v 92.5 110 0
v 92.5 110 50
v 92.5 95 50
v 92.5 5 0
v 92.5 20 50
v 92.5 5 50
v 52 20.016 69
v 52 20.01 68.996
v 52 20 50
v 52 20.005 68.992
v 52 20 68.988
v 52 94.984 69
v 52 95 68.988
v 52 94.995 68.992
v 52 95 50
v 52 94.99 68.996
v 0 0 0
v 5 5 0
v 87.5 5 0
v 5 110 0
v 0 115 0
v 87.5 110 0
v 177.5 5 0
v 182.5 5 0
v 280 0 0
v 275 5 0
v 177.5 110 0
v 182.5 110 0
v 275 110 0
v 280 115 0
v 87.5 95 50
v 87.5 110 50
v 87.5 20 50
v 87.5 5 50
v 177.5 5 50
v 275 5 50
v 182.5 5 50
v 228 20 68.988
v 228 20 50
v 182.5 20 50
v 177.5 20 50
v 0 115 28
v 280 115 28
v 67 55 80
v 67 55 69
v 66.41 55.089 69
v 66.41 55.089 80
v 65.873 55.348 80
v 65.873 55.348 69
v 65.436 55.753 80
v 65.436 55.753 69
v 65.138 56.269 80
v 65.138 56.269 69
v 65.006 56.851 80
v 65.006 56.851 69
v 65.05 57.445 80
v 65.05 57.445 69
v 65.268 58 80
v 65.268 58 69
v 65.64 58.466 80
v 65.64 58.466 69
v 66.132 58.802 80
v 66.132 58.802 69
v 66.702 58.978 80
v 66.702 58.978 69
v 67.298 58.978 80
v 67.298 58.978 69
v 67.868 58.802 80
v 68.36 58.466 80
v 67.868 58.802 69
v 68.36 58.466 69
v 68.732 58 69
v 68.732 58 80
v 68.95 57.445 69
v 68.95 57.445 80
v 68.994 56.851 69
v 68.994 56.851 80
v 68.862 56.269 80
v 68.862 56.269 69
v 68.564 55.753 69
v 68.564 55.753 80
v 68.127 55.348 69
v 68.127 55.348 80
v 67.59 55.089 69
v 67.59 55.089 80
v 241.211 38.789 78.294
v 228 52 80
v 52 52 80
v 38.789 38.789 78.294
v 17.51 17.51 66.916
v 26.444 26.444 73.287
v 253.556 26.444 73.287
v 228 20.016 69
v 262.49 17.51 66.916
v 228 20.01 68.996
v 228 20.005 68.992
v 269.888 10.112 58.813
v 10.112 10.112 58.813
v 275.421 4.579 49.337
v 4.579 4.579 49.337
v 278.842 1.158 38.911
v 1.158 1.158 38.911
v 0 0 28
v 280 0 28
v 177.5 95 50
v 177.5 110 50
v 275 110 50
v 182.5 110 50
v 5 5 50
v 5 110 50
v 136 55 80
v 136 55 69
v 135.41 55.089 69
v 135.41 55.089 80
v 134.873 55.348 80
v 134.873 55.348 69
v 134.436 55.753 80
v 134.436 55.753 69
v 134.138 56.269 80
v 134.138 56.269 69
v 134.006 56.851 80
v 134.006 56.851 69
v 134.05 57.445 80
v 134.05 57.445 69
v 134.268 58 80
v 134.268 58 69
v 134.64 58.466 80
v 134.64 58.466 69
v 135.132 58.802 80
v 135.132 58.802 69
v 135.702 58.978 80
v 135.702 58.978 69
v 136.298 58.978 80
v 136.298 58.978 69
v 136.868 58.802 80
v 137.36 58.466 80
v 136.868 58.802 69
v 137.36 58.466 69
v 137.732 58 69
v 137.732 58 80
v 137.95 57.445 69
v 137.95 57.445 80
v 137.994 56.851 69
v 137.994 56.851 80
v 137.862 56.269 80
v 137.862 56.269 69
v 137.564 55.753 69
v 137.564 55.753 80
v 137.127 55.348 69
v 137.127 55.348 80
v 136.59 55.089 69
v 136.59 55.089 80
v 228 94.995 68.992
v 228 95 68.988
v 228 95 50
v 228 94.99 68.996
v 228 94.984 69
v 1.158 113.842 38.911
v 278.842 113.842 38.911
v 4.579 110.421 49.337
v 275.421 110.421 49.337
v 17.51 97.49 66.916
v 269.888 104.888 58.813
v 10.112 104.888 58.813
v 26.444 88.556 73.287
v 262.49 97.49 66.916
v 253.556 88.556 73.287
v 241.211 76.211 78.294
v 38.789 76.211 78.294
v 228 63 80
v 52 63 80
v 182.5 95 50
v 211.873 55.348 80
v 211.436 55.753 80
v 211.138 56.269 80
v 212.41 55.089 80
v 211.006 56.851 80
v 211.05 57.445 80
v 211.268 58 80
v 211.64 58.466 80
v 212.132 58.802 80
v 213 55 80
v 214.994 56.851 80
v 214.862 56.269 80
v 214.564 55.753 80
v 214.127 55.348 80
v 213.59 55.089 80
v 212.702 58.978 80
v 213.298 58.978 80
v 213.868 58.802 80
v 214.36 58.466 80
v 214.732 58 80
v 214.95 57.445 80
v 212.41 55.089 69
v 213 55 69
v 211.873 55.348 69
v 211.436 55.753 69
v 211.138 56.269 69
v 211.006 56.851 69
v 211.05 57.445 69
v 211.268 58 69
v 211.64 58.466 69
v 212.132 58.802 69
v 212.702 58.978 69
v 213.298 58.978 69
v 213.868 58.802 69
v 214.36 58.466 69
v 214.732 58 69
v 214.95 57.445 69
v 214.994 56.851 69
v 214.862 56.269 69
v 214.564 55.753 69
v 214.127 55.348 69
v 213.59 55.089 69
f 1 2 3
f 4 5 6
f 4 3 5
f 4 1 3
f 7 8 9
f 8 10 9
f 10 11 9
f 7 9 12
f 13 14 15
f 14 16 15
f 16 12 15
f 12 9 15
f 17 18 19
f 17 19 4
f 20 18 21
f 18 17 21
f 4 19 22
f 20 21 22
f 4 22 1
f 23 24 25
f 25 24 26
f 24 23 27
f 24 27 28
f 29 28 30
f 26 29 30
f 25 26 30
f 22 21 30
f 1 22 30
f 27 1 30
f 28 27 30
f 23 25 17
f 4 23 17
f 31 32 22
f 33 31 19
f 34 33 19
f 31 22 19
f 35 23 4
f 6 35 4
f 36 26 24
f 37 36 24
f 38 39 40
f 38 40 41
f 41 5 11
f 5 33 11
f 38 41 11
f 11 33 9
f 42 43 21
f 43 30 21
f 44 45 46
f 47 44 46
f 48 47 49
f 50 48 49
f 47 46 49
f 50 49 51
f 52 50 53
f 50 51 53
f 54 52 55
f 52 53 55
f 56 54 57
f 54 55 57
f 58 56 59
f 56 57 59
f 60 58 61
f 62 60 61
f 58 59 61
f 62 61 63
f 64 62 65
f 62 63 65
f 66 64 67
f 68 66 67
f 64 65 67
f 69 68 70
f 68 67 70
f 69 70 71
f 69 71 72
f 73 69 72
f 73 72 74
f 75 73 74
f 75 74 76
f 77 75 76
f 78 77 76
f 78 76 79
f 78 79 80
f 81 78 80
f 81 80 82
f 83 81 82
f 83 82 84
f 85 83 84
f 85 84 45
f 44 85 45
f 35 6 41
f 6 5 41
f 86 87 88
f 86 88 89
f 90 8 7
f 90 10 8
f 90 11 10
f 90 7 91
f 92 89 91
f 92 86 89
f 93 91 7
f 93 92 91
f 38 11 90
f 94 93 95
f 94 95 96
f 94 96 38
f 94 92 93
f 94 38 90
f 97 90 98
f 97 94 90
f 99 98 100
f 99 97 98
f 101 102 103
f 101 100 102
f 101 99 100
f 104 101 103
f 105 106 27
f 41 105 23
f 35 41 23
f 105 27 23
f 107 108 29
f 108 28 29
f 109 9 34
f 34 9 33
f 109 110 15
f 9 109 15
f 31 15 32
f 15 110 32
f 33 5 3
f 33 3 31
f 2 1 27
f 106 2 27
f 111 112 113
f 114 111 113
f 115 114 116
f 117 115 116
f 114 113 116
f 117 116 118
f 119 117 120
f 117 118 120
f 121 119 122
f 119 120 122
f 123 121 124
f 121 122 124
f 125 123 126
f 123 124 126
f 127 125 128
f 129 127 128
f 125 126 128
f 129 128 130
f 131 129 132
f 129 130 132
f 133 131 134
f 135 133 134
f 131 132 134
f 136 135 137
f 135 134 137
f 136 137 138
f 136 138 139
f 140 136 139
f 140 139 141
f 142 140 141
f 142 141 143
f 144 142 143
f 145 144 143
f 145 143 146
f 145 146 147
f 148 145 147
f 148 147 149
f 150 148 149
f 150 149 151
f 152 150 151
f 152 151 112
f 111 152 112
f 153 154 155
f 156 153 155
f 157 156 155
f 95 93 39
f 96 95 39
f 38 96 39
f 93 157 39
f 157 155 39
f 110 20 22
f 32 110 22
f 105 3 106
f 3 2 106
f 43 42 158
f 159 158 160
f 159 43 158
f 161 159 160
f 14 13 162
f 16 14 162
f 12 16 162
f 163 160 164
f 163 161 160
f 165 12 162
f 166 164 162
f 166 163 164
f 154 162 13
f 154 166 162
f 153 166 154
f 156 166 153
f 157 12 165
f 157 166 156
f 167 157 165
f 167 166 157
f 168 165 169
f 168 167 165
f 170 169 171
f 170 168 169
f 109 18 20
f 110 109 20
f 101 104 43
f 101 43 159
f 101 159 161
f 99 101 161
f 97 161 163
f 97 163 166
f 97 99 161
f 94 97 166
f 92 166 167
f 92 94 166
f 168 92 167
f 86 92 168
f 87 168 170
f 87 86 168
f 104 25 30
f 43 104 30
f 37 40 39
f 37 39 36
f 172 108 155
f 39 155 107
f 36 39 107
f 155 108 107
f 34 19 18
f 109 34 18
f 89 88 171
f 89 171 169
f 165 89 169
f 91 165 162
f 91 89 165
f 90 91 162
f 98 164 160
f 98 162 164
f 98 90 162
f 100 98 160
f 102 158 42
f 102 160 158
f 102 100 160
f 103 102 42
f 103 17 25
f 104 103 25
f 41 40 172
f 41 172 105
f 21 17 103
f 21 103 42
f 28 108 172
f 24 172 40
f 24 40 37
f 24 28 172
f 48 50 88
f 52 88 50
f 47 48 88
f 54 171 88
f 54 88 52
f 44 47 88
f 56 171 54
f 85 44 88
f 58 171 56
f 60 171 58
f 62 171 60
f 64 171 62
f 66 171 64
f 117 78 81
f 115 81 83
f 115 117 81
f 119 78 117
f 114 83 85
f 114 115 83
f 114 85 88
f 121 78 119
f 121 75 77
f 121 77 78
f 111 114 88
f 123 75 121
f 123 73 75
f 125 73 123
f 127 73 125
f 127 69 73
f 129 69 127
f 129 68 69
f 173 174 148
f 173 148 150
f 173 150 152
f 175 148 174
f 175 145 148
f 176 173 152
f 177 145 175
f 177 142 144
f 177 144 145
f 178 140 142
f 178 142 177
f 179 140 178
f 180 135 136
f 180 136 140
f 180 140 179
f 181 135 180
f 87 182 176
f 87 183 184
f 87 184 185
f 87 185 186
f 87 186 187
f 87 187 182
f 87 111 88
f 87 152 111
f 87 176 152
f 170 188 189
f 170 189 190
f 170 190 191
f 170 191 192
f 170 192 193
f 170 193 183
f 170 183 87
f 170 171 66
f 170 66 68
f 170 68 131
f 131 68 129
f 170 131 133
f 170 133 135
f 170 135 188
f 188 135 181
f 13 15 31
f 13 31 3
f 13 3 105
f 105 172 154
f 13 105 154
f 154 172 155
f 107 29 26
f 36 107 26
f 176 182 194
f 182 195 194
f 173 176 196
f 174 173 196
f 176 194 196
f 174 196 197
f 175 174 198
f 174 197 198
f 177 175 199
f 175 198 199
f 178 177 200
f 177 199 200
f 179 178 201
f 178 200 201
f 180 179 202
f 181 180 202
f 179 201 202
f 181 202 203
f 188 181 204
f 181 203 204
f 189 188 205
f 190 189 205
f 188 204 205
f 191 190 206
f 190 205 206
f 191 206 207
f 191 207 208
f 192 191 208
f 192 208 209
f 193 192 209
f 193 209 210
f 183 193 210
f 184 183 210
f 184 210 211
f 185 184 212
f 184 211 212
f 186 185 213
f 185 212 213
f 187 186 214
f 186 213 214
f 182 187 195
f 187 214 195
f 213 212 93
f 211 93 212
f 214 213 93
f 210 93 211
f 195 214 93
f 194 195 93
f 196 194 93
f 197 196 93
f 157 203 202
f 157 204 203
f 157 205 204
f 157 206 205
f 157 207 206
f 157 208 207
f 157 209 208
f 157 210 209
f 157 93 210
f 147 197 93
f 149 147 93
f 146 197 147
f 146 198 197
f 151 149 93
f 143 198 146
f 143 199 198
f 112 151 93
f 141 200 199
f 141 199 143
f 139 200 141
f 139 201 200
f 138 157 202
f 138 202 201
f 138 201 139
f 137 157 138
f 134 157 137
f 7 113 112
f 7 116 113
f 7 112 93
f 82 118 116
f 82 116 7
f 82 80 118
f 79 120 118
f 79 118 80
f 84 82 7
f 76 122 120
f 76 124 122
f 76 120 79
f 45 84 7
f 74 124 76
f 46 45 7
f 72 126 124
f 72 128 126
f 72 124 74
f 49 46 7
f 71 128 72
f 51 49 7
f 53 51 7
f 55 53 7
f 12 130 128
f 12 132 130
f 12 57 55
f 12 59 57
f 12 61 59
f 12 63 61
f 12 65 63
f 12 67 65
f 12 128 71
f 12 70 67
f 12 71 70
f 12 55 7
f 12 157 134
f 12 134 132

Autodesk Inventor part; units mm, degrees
ref_plane "YZ Plane" through (0, 0, 0) normal (1, 0, 0) x (0, 1, 0)
ref_plane "XZ Plane" through (0, 0, 0) normal (0, 1, 0) x (-1, 0, 0)
ref_plane "XY Plane" through (0, 0, 0) normal (0, 0, 1) x (1, 0, 0)
sketch "Skizze1" plane through (0, 0, 0) normal (0, 0, 1) x (1, 0, 0)
  line L0 (-56, 0) -> (336, 0) projected
  line L1 (0, -23) -> (0, 138) projected
  line L2 (0, 0) -> (280, 0)
  line L3 (280, 0) -> (280, 115)
  line L4 (280, 115) -> (0, 115)
  line L5 (0, 115) -> (0, 0)
  line L6 (5, 110) -> (275, 110)
  line L7 (275, 110) -> (275, 5)
  line L8 (275, 5) -> (5, 5)
  line L9 (5, 5) -> (5, 110)
  point P0 (0, 115)
  dimension "d0" = 280
  dimension "d1" = 115
  dimension "d2" = 5
  dimension "d3" = 5
  dimension "d4" = 5
  dimension "d5" = 5
extrude "Extrusion1" add sketch "Skizze1" along normal blind 50
sketch "Skizze2" plane through (0, 0, 50) normal (0, 0, 1) x (1, 0, 0)
  point P0 (0, 0)
sketch "Skizze3" plane through (0, 0, 50) normal (0, 0, 1) x (1, 0, 0)
  line L0 (0, 115) -> (0, 0) projected
  line L1 (0, 0) -> (280, 0) projected
  line L2 (0, 115) -> (280, 115)
  line L3 (280, 115) -> (280, 0)
  line L4 (280, 0) -> (0, 0)
  line L5 (0, 0) -> (0, 115)
  line L6 (280, 115) -> (0, 115) projected
  line L7 (280, 0) -> (0, 0)
  line L8 (0, 0) -> (0, 115)
  line L9 (0, 115) -> (280, 115)
  line L10 (280, 115) -> (280, 0)
extrude "Extrusion2" add sketch "Skizze3" along normal blind 30
fillet "Rundung1" radius 52 4 edges at (140, 115, 80) (140, 0, 80) (0, 57.5, 80) (280, 57.5, 80)
sketch "Skizze5" plane through (0, 0, 0) normal (0, 0, -1) x (-1, 0, 0)
  line L0 (-5, 110) -> (-275, 110) projected
  line L1 (-182.5, 110) -> (-182.5, 5)
  line L2 (-275, 5) -> (-5, 5) projected
  line L3 (-92.5, 110) -> (-92.5, 5)
  line L4 (-275, 110) -> (-275, 5) projected
  line L5 (-177.5, 110) -> (-177.5, 5)
  line L6 (-87.5, 110) -> (-87.5, 5)
  point P0 (0, 0)
  dimension "d11" = 92.5
  dimension "d12" = 182.5
  dimension "d13" = 5
  dimension "d14" = 5
extrude "Extrusion3" add sketch "Skizze5" against normal blind 50 contours L6 L2 L3 L0 | L5 L2 L1 L0
sketch "Skizze6" plane through (0, 0, 80) normal (0, 0, 1) x (1, 0, 0)
  line L0 (52, 52) -> (52, 63) projected
  line L1 (228, 63) -> (228, 52) projected
  line L2 (177.5, 110) -> (177.5, 5) projected
  line L3 (52, 63) -> (228, 63) projected
  point P0 (0, 0)
  point P1 (67, 57)
  point P2 (136, 57)
  point P3 (213, 57)
  dimension "d17" = 15
  dimension "d18" = 15
  dimension "d19" = 41.5
  dimension "d20" = 6
  dimension "d21" = 6
  dimension "d22" = 6
hole "Bohrung1" at (67, 57, 80) at (136, 57, 80) at (213, 57, 80) direction (0, 0, -1) diameter 4 end through all
sketch "Skizze8" plane through (0, 0, 50) normal (0, 0, -1) x (-1, 0, 0)
  line L0 (-52, 95) -> (-228, 95)
  line L1 (-228, 95) -> (-228, 20)
  line L2 (-228, 20) -> (-52, 20)
  line L3 (-52, 20) -> (-52, 95)
  line L4 (-228, 63) -> (-228, 52) projected
  line L5 (-52, 52) -> (-52, 63) projected
  line L6 (-92.5, 110) -> (-177.5, 110) projected
  line L7 (-177.5, 5) -> (-92.5, 5) projected
  point P0 (0, 0)
  dimension "d30" = 0
  dimension "d31" = 0
  dimension "d32" = 15
  dimension "d33" = 15
extrude "Extrusion4" cut sketch "Skizze8" against normal blind 19
properties part number "DeckelKoch" material "Polyaryletherketon-Kunststoff"
